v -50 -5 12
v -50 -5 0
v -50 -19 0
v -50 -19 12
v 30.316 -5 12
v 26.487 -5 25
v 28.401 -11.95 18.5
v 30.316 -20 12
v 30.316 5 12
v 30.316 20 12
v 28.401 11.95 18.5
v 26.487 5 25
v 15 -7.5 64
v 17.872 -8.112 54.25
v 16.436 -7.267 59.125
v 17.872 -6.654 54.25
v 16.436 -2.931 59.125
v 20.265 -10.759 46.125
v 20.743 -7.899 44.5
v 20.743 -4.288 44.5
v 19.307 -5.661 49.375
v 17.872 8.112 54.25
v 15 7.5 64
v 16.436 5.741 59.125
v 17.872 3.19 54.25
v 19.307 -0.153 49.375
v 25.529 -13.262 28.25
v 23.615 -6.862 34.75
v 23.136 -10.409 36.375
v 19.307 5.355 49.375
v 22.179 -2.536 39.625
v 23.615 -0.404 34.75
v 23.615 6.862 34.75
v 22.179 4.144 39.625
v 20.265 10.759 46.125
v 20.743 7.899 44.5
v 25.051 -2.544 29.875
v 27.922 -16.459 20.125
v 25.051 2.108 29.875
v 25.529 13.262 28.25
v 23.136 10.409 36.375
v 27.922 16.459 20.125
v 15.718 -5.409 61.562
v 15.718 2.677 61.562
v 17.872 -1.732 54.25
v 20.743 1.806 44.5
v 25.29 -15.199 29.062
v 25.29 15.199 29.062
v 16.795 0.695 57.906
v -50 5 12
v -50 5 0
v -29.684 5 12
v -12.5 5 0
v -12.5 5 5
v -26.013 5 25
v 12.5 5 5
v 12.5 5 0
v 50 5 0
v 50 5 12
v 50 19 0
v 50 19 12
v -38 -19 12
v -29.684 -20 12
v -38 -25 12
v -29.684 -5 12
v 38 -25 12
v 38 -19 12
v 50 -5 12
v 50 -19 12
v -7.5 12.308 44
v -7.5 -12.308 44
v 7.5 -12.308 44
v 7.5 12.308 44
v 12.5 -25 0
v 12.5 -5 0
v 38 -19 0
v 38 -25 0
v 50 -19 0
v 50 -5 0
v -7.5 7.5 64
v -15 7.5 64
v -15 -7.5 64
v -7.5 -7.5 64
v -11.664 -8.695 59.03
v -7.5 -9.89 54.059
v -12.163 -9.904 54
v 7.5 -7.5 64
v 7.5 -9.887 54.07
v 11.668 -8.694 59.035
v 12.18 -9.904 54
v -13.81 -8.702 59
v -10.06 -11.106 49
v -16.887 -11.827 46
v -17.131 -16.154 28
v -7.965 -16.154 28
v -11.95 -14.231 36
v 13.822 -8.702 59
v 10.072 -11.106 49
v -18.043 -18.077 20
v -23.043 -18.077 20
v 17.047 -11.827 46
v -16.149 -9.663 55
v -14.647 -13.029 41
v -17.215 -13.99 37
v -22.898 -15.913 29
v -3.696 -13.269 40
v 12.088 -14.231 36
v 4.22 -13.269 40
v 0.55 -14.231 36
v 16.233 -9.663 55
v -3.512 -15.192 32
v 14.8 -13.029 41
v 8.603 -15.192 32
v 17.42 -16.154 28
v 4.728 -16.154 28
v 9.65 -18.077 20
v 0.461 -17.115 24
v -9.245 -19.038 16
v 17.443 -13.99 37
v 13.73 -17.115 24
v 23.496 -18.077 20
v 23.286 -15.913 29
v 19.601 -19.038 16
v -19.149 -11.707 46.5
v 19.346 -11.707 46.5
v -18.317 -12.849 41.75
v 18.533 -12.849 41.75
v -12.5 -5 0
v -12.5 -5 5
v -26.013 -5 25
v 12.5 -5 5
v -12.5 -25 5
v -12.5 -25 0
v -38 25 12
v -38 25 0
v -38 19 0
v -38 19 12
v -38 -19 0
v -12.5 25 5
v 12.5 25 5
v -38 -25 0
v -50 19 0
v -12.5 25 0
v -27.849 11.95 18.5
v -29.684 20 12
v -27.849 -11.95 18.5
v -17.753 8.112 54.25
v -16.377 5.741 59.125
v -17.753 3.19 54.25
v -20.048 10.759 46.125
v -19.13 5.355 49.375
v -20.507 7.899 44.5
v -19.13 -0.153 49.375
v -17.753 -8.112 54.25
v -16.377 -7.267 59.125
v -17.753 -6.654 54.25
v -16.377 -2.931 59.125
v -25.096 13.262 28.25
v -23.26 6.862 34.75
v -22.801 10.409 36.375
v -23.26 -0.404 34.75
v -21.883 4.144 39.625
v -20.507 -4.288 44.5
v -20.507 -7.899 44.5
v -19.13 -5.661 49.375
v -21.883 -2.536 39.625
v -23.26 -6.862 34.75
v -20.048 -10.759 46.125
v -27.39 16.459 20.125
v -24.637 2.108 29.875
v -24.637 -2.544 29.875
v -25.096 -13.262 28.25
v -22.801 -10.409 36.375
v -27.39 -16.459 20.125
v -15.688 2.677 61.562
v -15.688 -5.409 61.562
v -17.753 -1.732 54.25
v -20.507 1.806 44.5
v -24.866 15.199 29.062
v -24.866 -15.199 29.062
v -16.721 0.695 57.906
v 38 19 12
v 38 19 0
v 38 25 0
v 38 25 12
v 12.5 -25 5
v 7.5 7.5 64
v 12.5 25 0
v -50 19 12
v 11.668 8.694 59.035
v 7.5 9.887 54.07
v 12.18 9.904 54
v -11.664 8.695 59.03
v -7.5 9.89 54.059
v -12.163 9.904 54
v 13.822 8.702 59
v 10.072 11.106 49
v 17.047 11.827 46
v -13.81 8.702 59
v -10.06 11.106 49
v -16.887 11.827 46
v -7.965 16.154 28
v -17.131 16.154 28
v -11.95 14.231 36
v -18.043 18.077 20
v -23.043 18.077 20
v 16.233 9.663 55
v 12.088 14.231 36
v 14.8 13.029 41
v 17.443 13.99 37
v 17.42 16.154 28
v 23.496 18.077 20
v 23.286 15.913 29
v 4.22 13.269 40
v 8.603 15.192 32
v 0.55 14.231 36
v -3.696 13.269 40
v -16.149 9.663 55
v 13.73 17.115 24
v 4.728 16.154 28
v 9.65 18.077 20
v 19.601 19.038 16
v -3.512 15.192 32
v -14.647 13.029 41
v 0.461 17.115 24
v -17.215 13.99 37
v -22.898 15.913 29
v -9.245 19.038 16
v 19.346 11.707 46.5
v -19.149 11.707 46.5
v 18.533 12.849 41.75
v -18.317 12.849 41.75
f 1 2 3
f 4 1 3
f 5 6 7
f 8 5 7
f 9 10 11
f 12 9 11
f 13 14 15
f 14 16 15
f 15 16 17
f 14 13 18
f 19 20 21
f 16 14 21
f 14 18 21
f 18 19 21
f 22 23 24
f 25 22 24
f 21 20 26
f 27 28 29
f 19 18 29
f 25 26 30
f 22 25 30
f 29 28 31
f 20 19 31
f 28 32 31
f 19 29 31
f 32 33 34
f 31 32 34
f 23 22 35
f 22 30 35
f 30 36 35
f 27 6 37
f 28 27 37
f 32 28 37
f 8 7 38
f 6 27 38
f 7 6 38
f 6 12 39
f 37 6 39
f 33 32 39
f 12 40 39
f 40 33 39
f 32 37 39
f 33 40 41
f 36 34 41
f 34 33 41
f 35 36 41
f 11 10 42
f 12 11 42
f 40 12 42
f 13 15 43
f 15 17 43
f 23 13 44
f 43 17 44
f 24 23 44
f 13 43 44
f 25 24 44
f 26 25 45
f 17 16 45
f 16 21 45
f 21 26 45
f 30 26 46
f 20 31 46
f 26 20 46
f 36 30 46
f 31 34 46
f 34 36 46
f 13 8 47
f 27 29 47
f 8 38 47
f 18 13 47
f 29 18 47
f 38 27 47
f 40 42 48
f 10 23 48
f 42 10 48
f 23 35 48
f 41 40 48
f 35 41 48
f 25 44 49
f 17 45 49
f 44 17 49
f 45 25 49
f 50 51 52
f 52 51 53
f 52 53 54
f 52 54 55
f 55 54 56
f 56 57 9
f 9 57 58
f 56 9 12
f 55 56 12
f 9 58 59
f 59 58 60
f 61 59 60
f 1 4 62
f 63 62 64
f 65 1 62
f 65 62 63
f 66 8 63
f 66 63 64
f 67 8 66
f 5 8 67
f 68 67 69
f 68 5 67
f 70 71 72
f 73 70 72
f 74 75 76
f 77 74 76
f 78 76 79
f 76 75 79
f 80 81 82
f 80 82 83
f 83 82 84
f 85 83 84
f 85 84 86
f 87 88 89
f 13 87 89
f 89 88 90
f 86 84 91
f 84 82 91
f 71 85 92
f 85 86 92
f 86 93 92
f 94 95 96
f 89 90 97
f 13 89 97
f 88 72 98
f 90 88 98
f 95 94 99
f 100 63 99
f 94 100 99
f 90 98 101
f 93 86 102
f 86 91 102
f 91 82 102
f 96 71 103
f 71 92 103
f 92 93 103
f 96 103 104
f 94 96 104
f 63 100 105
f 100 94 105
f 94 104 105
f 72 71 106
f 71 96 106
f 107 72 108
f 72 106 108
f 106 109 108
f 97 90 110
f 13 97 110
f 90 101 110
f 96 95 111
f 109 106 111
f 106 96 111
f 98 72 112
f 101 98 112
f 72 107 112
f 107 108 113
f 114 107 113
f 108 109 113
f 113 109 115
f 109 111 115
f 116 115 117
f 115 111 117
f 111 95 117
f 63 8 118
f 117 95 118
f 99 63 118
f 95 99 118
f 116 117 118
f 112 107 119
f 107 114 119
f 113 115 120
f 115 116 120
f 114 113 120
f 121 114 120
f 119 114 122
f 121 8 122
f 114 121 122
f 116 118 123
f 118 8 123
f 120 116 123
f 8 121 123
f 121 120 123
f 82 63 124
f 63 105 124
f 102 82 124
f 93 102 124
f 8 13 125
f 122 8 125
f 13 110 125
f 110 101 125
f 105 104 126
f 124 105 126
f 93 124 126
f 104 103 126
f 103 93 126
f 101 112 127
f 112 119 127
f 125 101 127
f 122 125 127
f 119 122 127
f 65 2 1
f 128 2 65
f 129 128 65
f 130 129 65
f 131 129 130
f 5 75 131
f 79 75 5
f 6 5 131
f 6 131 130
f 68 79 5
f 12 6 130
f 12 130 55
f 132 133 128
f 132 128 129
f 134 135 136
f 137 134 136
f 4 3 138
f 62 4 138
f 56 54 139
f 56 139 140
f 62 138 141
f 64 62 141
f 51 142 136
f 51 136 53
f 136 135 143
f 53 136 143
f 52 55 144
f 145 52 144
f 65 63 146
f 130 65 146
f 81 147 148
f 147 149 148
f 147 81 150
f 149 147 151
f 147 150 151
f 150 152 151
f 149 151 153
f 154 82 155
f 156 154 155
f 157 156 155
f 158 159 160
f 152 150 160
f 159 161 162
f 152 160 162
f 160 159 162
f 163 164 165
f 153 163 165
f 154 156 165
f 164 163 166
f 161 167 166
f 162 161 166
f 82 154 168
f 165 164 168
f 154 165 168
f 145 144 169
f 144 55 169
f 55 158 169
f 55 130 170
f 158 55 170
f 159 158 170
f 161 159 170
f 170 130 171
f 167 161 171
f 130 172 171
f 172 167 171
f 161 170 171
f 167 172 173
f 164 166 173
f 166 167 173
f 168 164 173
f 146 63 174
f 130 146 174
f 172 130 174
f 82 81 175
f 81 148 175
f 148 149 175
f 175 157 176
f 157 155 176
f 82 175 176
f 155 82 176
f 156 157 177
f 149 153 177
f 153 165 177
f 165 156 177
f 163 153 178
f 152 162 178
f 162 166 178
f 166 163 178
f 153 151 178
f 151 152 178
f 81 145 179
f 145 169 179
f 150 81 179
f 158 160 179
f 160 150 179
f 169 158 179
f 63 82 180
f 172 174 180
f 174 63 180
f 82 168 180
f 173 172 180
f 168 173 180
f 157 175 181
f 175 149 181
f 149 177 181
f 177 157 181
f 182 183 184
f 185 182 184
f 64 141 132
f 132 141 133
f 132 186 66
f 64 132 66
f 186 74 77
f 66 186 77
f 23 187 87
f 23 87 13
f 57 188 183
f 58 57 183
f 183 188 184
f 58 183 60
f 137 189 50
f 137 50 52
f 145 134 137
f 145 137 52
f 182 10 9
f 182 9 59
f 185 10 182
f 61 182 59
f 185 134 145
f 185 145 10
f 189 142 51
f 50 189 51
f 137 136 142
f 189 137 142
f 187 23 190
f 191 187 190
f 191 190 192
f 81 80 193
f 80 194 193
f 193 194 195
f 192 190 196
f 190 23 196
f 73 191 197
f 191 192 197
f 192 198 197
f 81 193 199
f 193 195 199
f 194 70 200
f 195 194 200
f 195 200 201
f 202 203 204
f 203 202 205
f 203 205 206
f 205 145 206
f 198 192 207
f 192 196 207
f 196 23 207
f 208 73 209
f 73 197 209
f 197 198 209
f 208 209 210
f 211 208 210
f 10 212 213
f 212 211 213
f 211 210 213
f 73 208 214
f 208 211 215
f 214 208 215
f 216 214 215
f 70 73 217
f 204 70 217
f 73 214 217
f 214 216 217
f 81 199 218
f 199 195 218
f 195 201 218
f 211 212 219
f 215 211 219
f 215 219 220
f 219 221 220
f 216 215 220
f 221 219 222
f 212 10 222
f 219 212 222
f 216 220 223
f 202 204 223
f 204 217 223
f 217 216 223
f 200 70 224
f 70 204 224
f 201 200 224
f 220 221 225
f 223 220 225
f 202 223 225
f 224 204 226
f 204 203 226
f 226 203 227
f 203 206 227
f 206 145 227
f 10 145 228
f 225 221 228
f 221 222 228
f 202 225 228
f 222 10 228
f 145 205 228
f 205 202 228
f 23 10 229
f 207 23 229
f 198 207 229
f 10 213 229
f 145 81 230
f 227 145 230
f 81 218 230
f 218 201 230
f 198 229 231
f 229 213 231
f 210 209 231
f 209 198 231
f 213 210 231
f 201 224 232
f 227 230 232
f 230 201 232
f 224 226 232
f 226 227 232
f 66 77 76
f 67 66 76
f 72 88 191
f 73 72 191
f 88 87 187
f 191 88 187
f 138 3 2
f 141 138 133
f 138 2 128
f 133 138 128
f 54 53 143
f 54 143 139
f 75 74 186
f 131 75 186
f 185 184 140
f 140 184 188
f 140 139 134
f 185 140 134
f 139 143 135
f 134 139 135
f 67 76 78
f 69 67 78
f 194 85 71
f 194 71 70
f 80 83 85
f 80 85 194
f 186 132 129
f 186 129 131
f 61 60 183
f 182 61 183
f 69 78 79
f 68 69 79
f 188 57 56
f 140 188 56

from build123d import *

# Parameters (mm, degrees)
SKETCH002_W     = 30
SKETCH002_H     = 15
SKETCH001_W     = 60
SKETCH001_H     = 40
PAD_DEPTH       = 12
SKETCH003_W     = 10
SKETCH003_H     = 25
POCKET_DEPTH    = 100.001
SKETCH004_W     = 15
SKETCH004_H     = 31.516928
POCKET001_DEPTH = 20
SKETCH005_W     = 25
SKETCH005_H     = 5
POCKET002_DEPTH = 50.001


with BuildPart() as loft_body:
    # Sketch002 → Loft section 0
    with BuildSketch(Plane.XY.offset(64)):
        Rectangle(SKETCH002_W, SKETCH002_H)
    # Sketch001 → Loft section 1
    with BuildSketch(Plane.XY.offset(12)):
        with Locations((0.31551, 0)):
            Rectangle(SKETCH001_W, SKETCH001_H)
    loft()


with BuildPart() as pocket002:
    # Sketch → Pad (new body)
    with BuildSketch(Plane.XY):
        Polygon((-38, -25), (38, -25), (38, -19), (50, -19), (50, 19), (38, 19), (38, 25), (-38, 25), (-38, 19), (-50, 19), (-50, -19), (-38, -19), align=None)
    extrude(amount=PAD_DEPTH)

    # Fusion: union Loft body
    add(loft_body.part)

    # Sketch003 → Pocket (cut, through all)
    with BuildSketch(Plane.YZ.offset(50)):
        with Locations((0, 12.5)):
            Rectangle(SKETCH003_W, SKETCH003_H)
    extrude(amount=-POCKET_DEPTH, mode=Mode.SUBTRACT)

    # Sketch004 → Pocket001 (cut)
    with BuildSketch(Plane.XY.offset(64)):
        Rectangle(SKETCH004_W, SKETCH004_H)
    extrude(amount=-POCKET001_DEPTH, mode=Mode.SUBTRACT)

    # Sketch005 → Pocket002 (cut, through all)
    with BuildSketch(Plane.XZ.offset(25)):
        with Locations((0, 2.5)):
            Rectangle(SKETCH005_W, SKETCH005_H)
    extrude(amount=-POCKET002_DEPTH, mode=Mode.SUBTRACT)


solid = pocket002.part
